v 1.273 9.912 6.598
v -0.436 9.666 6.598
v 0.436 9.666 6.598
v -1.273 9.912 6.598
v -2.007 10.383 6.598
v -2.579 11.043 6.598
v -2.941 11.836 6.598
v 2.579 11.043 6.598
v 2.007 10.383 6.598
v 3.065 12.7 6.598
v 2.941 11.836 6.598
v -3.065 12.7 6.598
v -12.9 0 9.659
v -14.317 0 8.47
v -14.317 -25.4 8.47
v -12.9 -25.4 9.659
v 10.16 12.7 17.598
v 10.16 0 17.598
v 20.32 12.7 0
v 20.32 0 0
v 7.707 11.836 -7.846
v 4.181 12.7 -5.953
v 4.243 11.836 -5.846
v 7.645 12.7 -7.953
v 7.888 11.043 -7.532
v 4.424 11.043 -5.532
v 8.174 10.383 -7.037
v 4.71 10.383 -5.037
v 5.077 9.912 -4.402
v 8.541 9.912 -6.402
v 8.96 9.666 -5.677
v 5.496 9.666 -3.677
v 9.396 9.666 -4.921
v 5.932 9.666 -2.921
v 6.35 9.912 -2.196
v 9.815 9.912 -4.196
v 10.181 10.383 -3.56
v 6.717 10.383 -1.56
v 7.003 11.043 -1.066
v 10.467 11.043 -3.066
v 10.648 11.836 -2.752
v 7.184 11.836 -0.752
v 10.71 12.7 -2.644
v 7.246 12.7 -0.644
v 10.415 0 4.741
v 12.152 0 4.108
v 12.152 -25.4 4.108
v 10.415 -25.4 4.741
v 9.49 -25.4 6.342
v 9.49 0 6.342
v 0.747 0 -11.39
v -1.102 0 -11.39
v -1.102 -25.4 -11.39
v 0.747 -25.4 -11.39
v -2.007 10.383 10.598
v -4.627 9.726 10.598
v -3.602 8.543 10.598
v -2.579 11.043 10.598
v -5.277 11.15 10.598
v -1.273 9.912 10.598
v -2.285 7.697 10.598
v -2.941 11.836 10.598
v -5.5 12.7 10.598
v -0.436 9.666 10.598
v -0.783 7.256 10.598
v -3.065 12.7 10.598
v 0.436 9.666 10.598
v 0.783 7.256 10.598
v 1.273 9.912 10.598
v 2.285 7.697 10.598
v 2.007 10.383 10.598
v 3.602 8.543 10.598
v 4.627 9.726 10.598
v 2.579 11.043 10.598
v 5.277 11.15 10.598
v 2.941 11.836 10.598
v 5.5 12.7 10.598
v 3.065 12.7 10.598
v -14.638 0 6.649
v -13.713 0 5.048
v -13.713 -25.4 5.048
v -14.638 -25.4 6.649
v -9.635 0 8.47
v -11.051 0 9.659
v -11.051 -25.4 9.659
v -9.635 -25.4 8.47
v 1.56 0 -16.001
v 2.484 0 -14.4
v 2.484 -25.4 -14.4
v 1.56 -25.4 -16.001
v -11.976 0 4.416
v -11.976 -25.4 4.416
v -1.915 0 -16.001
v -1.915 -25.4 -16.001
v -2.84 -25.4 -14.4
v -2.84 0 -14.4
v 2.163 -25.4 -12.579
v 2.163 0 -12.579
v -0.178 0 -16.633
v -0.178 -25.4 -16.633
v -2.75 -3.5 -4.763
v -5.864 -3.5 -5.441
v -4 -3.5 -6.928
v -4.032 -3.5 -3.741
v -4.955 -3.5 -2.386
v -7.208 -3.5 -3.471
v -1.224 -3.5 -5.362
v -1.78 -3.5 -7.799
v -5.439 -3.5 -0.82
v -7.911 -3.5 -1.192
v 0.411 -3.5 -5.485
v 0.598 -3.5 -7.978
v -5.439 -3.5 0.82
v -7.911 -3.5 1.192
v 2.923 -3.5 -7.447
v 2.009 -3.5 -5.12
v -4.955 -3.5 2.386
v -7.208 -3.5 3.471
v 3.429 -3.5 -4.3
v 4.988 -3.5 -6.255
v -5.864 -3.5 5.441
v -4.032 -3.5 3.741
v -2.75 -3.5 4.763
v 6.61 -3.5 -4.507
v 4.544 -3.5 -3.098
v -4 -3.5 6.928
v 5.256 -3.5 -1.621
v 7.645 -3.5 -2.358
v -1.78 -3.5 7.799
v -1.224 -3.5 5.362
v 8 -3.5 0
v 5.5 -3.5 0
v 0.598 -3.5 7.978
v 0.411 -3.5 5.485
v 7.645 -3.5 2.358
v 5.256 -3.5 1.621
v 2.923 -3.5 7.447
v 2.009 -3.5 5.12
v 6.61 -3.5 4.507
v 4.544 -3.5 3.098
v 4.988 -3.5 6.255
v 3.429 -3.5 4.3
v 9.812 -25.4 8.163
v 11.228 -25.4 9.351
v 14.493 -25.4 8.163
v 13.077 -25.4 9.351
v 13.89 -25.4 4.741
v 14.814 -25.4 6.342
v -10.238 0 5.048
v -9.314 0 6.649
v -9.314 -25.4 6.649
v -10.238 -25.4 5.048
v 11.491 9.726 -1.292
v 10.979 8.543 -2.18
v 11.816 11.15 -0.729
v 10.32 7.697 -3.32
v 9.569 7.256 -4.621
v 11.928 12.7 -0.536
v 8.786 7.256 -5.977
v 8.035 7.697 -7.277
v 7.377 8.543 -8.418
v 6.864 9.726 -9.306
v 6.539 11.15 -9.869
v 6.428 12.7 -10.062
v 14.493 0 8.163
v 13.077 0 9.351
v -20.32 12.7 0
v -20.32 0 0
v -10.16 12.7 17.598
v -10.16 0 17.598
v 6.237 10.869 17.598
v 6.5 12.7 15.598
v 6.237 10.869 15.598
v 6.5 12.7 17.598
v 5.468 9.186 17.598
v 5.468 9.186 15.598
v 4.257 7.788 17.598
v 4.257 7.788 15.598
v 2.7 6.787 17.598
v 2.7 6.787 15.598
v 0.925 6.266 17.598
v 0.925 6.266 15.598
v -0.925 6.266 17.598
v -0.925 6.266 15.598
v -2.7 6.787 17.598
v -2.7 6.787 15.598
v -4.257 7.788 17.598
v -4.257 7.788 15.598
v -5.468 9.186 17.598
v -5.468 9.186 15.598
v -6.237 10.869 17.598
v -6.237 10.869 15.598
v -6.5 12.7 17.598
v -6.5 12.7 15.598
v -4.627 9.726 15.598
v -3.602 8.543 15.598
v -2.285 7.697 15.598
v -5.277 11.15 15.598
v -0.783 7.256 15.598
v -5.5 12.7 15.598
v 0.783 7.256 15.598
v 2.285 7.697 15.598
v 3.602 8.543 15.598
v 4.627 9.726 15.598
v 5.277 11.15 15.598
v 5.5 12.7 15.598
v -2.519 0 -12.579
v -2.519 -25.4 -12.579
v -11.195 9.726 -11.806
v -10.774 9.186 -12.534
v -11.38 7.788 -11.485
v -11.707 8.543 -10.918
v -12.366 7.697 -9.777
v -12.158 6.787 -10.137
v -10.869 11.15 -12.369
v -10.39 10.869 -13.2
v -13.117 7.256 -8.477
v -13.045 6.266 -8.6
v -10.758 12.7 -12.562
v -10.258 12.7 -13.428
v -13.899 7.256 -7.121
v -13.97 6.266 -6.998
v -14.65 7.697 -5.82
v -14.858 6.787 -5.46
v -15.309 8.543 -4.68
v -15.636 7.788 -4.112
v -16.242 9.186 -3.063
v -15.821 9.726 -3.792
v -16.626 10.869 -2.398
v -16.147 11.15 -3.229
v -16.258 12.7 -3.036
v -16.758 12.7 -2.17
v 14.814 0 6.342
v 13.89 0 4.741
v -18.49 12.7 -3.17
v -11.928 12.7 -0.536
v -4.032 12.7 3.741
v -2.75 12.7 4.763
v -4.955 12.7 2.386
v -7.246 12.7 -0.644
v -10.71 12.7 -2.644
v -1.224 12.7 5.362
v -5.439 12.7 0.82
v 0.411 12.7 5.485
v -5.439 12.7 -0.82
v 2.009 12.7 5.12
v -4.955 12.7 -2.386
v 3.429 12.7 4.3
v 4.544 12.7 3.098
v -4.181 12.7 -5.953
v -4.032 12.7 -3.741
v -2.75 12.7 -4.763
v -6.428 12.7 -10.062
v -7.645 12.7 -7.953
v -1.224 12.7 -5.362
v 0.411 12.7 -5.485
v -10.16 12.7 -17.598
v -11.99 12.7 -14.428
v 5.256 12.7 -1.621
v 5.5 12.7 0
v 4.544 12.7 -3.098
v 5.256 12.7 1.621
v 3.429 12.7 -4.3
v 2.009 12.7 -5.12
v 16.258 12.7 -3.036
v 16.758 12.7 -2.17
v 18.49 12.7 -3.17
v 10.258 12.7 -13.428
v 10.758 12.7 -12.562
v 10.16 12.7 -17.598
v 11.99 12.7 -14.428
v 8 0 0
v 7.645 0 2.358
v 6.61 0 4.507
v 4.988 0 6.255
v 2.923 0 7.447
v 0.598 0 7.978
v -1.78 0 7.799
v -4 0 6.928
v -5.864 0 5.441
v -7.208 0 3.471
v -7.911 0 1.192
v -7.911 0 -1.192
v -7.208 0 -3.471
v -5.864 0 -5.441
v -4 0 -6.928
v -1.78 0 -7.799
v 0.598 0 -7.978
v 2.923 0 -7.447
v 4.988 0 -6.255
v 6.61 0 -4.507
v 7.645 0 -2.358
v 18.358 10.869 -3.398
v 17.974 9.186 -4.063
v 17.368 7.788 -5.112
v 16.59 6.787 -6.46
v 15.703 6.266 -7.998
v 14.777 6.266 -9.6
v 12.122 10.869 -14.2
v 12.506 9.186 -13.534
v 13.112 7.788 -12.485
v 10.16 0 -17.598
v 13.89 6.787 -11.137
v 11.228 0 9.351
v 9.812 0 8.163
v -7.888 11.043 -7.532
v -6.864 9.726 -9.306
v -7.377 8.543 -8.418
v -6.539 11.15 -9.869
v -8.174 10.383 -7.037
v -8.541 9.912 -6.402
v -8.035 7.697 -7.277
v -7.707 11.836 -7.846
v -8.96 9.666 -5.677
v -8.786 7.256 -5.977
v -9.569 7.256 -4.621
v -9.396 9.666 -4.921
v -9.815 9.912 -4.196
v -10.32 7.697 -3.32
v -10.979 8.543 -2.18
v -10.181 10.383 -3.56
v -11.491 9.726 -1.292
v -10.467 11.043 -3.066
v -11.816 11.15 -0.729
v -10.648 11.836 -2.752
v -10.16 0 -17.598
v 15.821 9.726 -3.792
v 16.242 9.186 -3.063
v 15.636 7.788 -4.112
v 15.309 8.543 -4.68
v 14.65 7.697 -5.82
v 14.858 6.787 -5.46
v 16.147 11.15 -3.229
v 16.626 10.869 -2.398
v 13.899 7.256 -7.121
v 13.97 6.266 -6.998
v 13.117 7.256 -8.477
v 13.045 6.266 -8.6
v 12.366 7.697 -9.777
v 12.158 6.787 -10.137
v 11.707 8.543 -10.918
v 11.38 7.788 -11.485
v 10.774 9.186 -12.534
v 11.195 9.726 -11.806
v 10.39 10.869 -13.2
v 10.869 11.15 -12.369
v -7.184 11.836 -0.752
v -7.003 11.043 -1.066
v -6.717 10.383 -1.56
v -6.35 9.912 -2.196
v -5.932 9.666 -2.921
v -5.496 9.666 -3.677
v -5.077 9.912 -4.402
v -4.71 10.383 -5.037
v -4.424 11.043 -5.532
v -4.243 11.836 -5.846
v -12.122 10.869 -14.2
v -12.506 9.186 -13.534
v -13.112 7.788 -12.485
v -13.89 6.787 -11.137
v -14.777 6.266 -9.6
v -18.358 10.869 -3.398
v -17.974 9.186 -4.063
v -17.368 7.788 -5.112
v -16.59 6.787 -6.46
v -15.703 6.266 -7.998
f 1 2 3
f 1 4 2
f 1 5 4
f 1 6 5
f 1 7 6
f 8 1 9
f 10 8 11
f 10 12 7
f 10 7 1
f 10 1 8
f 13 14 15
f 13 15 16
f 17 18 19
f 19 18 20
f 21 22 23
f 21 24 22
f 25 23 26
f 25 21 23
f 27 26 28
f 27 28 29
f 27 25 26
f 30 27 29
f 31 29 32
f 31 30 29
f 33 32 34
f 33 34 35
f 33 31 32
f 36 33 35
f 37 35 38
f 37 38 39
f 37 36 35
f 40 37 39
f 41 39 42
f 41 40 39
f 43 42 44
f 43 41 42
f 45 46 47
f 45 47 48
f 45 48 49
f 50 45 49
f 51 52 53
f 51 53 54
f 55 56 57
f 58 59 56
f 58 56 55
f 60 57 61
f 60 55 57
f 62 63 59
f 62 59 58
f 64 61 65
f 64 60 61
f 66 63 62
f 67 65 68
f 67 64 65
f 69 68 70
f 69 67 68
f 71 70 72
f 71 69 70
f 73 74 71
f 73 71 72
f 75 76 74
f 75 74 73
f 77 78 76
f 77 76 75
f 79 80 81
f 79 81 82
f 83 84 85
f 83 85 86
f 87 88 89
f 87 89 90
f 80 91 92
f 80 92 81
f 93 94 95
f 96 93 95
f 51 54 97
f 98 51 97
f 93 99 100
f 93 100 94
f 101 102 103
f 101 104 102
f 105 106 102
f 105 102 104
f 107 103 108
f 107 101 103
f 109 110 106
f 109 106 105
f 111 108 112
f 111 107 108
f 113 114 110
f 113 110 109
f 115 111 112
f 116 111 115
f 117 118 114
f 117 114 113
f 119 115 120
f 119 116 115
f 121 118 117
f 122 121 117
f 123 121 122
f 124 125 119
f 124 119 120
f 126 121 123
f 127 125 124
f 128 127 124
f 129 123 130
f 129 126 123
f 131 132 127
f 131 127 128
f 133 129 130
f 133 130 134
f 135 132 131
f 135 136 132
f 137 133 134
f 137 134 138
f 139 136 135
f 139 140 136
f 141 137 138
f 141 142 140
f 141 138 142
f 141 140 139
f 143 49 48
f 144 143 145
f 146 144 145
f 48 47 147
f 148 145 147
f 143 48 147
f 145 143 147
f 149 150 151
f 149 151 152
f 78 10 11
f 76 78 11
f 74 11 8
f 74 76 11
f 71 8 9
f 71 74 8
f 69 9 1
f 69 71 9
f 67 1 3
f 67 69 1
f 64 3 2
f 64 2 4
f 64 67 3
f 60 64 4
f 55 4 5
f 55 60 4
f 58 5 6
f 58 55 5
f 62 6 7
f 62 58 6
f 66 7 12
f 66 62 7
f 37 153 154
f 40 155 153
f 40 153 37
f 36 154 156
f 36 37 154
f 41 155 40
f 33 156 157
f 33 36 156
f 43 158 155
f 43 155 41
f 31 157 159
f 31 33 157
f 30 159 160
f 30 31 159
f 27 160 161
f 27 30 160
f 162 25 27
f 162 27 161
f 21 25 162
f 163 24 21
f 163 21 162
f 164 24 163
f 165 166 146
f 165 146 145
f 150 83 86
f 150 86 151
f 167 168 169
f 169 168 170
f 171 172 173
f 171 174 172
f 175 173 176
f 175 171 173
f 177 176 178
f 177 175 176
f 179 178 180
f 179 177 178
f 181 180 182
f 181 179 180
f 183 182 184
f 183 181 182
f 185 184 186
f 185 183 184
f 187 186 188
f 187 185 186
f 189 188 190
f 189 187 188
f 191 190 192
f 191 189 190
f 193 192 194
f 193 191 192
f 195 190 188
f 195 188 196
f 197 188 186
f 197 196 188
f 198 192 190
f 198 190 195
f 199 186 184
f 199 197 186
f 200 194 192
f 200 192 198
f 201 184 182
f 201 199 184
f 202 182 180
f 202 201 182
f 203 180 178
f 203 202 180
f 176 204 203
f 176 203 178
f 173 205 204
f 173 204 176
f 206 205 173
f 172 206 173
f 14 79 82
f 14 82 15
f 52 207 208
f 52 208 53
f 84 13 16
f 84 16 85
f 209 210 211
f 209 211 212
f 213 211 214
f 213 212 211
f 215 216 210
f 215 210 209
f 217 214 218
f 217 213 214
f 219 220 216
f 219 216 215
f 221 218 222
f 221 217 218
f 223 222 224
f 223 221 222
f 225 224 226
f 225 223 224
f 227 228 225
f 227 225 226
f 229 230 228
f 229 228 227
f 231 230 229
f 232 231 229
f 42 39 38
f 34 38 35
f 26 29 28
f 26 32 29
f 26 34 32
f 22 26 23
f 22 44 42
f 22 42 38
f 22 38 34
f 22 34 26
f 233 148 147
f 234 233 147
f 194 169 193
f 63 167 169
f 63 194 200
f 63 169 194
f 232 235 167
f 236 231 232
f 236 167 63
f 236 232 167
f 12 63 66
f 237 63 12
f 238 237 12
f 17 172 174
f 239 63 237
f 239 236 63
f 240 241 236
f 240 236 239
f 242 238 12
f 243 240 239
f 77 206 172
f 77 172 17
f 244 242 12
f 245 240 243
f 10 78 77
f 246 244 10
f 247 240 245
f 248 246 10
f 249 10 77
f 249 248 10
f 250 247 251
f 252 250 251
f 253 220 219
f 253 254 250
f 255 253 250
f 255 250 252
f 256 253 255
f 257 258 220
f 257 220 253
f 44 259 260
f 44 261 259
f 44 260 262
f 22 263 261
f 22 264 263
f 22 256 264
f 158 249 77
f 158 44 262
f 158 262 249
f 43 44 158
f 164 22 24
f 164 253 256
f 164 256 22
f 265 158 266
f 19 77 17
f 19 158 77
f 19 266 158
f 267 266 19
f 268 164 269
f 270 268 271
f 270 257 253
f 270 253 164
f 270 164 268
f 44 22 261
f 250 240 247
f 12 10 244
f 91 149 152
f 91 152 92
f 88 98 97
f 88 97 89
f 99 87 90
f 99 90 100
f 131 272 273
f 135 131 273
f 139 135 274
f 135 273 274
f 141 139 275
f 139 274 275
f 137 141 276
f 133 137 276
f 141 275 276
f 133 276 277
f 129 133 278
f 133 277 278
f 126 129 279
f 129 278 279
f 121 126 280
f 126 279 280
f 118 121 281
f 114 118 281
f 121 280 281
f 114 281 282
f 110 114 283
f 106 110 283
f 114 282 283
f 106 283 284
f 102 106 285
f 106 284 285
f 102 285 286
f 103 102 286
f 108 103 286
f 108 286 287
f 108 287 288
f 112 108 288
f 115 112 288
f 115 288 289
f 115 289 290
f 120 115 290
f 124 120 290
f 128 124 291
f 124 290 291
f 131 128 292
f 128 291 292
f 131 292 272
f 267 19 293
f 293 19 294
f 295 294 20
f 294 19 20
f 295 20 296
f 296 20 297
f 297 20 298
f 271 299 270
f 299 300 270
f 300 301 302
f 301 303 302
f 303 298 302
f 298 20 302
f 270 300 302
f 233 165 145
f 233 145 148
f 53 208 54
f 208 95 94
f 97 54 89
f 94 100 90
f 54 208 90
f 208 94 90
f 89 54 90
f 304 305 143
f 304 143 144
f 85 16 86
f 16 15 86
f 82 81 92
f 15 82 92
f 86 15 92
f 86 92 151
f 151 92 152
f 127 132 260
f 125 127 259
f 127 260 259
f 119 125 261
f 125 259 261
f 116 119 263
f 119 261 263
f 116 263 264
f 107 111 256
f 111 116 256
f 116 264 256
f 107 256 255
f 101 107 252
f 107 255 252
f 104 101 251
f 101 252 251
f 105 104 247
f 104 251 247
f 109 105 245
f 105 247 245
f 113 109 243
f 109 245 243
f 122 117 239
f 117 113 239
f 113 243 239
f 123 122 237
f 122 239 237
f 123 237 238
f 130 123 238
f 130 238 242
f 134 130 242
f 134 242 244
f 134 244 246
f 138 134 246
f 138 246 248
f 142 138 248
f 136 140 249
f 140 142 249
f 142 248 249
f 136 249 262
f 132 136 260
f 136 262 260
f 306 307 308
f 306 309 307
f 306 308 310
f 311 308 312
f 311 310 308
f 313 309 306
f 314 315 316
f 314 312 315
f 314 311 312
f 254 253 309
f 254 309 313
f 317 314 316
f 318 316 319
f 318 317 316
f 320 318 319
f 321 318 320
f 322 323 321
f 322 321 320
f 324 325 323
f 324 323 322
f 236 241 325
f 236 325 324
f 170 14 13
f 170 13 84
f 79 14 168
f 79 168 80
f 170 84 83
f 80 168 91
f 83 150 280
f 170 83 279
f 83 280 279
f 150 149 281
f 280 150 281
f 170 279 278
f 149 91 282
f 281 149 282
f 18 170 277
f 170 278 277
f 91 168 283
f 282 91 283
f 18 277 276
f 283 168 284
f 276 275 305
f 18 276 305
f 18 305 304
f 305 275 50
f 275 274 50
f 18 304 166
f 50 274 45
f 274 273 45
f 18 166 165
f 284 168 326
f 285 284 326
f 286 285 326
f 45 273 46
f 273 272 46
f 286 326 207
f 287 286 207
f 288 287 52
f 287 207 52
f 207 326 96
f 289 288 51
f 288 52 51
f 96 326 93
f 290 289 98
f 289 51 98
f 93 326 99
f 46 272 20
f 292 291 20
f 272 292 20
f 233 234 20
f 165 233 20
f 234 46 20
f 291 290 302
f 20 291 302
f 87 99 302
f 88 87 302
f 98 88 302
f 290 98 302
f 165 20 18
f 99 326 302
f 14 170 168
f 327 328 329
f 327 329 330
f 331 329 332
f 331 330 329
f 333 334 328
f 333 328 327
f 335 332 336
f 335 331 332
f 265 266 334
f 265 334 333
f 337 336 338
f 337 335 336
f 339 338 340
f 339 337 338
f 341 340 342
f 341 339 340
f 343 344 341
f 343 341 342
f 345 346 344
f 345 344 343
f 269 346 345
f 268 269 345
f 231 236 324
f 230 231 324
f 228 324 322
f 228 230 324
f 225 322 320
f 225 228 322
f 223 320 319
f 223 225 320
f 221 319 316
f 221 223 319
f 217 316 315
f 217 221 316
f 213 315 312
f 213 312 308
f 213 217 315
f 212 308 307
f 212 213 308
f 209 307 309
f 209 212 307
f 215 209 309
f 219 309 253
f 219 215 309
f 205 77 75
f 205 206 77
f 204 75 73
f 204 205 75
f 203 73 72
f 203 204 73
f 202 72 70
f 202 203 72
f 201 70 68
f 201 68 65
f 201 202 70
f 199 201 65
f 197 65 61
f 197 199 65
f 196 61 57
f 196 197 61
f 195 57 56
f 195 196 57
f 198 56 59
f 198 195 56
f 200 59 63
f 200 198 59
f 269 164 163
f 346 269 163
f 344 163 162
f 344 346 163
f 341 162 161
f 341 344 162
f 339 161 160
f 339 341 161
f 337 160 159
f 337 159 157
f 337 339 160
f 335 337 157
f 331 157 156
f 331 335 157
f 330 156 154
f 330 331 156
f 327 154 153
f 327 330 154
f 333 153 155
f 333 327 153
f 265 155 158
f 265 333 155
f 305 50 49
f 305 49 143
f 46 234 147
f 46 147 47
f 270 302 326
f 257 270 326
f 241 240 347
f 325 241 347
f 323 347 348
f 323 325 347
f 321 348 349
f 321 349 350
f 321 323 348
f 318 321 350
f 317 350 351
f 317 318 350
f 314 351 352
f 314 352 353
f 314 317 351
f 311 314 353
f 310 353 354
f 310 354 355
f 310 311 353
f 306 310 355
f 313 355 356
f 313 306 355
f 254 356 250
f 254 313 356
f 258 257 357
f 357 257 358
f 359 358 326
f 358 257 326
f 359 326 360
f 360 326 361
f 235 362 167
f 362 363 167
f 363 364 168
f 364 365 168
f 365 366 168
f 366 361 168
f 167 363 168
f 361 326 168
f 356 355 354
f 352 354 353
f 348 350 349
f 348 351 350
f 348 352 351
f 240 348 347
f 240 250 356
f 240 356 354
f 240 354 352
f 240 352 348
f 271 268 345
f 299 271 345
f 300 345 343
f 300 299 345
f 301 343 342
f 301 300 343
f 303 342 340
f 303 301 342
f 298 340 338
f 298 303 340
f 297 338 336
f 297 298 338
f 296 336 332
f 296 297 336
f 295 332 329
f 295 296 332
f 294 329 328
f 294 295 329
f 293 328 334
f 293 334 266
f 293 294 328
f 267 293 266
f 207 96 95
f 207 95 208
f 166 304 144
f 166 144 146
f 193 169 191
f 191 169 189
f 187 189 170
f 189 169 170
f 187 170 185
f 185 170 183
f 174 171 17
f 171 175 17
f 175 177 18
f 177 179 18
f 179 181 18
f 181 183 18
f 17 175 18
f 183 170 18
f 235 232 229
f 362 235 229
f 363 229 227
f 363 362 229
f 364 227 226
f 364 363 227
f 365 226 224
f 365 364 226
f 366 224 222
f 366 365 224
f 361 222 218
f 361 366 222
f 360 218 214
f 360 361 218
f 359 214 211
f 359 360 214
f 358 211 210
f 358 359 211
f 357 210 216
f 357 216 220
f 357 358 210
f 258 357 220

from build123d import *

# Parameters (mm, degrees)
BOSS_EXTRUDE1_DEPTH = 12.7
SKETCH2_R           = 8
SKETCH2_R_2         = 5.5
BOSS_EXTRUDE2_DEPTH = 3.499999906
CIRPATTERN1_COUNT   = 3
SKETCH6_R           = 5.5
CUT_EXTRUDE1_DEPTH  = 17.199999906
BOSS_EXTRUDE3_DEPTH = 25.4


with BuildPart() as part:
    # Sketch1 → Boss-Extrude1 (new body)
    with BuildSketch(Plane(origin=(0, 0, 0), x_dir=(1, 0, 0), z_dir=(0, 1, 0))):
        Polygon((10.16, -17.597636205), (20.32, 0), (10.16, 17.597636205), (-10.16, 17.597636205), (-20.32, 0), (-10.16, -17.597636205), align=None)
    extrude(amount=BOSS_EXTRUDE1_DEPTH)

    # Sketch2 → Boss-Extrude2 (add)
    with BuildSketch(Plane.XZ):
        Circle(SKETCH2_R)
        Circle(SKETCH2_R_2, mode=Mode.SUBTRACT)
    extrude(amount=BOSS_EXTRUDE2_DEPTH)

    # Sketch5 → Cut-Revolve1 (revolve, cut)
    with BuildSketch(Plane(origin=(0, 12.7, 0), x_dir=(1, 0, 0), z_dir=(0, 1, 0))):
        Polygon((0, -17.597636205), (0, -6.597636205), (-3.065310501, -6.597636205), (-3.065310501, -10.597636205), (-5.5, -10.597636205), (-5.5, -15.597636205), (-6.5, -15.597636205), (-6.5, -17.597636205), align=None)
    cut_revolve1 = revolve(axis=Axis((0, 12.7, 17.597636205), (0, 0, -1)), mode=Mode.SUBTRACT)

    # CirPattern1: Cut-Revolve1 ×3 about axis
    cirpattern1_axis = Axis((0, 0, 0), (0, 1, 0))
    for i in range(1, CIRPATTERN1_COUNT):
        add(cut_revolve1.rotate(cirpattern1_axis, i * 360 / CIRPATTERN1_COUNT), mode=Mode.SUBTRACT)

    # Sketch6 → Cut-Extrude1 (cut, through all)
    with BuildSketch(Plane(origin=(0, 12.7, 0), x_dir=(1, 0, 0), z_dir=(0, 1, 0))):
        Circle(SKETCH6_R)
    extrude(amount=-CUT_EXTRUDE1_DEPTH, mode=Mode.SUBTRACT)

    # Sketch8 → Boss-Extrude3 (add)
    with BuildSketch(Plane(origin=(0, 0, 0), x_dir=(1, 0, 0), z_dir=(0, 1, 0))):
        Polygon((-1.915248015, 16.000954519), (-2.83973241, 14.399700576), (-2.518662349, 12.578821777), (-1.102270082, 11.390327548), (0.746698708, 11.390327548), (2.163090976, 12.578821777), (2.484161036, 14.399700576), (1.559676641, 16.000954519), (-0.177785687, 16.63333909), align=None)
        Polygon((14.814348451, -6.342126208), (13.889864056, -4.740872265), (12.152401728, -4.108487694), (10.4149394, -4.740872265), (9.490455005, -6.342126208), (9.811525066, -8.163005007), (11.227917333, -9.351499236), (13.076886123, -9.351499236), (14.49327839, -8.163005007), align=None)
        Polygon((-12.90012529, -9.658841379), (-11.0511565, -9.658841379), (-9.634764233, -8.47034715), (-9.313694172, -6.64946835), (-10.238178567, -5.048214407), (-11.975640895, -4.415829837), (-13.713103223, -5.048214407), (-14.637587618, -6.64946835), (-14.316517557, -8.47034715), align=None)
    extrude(amount=-BOSS_EXTRUDE3_DEPTH)


solid = part.part
